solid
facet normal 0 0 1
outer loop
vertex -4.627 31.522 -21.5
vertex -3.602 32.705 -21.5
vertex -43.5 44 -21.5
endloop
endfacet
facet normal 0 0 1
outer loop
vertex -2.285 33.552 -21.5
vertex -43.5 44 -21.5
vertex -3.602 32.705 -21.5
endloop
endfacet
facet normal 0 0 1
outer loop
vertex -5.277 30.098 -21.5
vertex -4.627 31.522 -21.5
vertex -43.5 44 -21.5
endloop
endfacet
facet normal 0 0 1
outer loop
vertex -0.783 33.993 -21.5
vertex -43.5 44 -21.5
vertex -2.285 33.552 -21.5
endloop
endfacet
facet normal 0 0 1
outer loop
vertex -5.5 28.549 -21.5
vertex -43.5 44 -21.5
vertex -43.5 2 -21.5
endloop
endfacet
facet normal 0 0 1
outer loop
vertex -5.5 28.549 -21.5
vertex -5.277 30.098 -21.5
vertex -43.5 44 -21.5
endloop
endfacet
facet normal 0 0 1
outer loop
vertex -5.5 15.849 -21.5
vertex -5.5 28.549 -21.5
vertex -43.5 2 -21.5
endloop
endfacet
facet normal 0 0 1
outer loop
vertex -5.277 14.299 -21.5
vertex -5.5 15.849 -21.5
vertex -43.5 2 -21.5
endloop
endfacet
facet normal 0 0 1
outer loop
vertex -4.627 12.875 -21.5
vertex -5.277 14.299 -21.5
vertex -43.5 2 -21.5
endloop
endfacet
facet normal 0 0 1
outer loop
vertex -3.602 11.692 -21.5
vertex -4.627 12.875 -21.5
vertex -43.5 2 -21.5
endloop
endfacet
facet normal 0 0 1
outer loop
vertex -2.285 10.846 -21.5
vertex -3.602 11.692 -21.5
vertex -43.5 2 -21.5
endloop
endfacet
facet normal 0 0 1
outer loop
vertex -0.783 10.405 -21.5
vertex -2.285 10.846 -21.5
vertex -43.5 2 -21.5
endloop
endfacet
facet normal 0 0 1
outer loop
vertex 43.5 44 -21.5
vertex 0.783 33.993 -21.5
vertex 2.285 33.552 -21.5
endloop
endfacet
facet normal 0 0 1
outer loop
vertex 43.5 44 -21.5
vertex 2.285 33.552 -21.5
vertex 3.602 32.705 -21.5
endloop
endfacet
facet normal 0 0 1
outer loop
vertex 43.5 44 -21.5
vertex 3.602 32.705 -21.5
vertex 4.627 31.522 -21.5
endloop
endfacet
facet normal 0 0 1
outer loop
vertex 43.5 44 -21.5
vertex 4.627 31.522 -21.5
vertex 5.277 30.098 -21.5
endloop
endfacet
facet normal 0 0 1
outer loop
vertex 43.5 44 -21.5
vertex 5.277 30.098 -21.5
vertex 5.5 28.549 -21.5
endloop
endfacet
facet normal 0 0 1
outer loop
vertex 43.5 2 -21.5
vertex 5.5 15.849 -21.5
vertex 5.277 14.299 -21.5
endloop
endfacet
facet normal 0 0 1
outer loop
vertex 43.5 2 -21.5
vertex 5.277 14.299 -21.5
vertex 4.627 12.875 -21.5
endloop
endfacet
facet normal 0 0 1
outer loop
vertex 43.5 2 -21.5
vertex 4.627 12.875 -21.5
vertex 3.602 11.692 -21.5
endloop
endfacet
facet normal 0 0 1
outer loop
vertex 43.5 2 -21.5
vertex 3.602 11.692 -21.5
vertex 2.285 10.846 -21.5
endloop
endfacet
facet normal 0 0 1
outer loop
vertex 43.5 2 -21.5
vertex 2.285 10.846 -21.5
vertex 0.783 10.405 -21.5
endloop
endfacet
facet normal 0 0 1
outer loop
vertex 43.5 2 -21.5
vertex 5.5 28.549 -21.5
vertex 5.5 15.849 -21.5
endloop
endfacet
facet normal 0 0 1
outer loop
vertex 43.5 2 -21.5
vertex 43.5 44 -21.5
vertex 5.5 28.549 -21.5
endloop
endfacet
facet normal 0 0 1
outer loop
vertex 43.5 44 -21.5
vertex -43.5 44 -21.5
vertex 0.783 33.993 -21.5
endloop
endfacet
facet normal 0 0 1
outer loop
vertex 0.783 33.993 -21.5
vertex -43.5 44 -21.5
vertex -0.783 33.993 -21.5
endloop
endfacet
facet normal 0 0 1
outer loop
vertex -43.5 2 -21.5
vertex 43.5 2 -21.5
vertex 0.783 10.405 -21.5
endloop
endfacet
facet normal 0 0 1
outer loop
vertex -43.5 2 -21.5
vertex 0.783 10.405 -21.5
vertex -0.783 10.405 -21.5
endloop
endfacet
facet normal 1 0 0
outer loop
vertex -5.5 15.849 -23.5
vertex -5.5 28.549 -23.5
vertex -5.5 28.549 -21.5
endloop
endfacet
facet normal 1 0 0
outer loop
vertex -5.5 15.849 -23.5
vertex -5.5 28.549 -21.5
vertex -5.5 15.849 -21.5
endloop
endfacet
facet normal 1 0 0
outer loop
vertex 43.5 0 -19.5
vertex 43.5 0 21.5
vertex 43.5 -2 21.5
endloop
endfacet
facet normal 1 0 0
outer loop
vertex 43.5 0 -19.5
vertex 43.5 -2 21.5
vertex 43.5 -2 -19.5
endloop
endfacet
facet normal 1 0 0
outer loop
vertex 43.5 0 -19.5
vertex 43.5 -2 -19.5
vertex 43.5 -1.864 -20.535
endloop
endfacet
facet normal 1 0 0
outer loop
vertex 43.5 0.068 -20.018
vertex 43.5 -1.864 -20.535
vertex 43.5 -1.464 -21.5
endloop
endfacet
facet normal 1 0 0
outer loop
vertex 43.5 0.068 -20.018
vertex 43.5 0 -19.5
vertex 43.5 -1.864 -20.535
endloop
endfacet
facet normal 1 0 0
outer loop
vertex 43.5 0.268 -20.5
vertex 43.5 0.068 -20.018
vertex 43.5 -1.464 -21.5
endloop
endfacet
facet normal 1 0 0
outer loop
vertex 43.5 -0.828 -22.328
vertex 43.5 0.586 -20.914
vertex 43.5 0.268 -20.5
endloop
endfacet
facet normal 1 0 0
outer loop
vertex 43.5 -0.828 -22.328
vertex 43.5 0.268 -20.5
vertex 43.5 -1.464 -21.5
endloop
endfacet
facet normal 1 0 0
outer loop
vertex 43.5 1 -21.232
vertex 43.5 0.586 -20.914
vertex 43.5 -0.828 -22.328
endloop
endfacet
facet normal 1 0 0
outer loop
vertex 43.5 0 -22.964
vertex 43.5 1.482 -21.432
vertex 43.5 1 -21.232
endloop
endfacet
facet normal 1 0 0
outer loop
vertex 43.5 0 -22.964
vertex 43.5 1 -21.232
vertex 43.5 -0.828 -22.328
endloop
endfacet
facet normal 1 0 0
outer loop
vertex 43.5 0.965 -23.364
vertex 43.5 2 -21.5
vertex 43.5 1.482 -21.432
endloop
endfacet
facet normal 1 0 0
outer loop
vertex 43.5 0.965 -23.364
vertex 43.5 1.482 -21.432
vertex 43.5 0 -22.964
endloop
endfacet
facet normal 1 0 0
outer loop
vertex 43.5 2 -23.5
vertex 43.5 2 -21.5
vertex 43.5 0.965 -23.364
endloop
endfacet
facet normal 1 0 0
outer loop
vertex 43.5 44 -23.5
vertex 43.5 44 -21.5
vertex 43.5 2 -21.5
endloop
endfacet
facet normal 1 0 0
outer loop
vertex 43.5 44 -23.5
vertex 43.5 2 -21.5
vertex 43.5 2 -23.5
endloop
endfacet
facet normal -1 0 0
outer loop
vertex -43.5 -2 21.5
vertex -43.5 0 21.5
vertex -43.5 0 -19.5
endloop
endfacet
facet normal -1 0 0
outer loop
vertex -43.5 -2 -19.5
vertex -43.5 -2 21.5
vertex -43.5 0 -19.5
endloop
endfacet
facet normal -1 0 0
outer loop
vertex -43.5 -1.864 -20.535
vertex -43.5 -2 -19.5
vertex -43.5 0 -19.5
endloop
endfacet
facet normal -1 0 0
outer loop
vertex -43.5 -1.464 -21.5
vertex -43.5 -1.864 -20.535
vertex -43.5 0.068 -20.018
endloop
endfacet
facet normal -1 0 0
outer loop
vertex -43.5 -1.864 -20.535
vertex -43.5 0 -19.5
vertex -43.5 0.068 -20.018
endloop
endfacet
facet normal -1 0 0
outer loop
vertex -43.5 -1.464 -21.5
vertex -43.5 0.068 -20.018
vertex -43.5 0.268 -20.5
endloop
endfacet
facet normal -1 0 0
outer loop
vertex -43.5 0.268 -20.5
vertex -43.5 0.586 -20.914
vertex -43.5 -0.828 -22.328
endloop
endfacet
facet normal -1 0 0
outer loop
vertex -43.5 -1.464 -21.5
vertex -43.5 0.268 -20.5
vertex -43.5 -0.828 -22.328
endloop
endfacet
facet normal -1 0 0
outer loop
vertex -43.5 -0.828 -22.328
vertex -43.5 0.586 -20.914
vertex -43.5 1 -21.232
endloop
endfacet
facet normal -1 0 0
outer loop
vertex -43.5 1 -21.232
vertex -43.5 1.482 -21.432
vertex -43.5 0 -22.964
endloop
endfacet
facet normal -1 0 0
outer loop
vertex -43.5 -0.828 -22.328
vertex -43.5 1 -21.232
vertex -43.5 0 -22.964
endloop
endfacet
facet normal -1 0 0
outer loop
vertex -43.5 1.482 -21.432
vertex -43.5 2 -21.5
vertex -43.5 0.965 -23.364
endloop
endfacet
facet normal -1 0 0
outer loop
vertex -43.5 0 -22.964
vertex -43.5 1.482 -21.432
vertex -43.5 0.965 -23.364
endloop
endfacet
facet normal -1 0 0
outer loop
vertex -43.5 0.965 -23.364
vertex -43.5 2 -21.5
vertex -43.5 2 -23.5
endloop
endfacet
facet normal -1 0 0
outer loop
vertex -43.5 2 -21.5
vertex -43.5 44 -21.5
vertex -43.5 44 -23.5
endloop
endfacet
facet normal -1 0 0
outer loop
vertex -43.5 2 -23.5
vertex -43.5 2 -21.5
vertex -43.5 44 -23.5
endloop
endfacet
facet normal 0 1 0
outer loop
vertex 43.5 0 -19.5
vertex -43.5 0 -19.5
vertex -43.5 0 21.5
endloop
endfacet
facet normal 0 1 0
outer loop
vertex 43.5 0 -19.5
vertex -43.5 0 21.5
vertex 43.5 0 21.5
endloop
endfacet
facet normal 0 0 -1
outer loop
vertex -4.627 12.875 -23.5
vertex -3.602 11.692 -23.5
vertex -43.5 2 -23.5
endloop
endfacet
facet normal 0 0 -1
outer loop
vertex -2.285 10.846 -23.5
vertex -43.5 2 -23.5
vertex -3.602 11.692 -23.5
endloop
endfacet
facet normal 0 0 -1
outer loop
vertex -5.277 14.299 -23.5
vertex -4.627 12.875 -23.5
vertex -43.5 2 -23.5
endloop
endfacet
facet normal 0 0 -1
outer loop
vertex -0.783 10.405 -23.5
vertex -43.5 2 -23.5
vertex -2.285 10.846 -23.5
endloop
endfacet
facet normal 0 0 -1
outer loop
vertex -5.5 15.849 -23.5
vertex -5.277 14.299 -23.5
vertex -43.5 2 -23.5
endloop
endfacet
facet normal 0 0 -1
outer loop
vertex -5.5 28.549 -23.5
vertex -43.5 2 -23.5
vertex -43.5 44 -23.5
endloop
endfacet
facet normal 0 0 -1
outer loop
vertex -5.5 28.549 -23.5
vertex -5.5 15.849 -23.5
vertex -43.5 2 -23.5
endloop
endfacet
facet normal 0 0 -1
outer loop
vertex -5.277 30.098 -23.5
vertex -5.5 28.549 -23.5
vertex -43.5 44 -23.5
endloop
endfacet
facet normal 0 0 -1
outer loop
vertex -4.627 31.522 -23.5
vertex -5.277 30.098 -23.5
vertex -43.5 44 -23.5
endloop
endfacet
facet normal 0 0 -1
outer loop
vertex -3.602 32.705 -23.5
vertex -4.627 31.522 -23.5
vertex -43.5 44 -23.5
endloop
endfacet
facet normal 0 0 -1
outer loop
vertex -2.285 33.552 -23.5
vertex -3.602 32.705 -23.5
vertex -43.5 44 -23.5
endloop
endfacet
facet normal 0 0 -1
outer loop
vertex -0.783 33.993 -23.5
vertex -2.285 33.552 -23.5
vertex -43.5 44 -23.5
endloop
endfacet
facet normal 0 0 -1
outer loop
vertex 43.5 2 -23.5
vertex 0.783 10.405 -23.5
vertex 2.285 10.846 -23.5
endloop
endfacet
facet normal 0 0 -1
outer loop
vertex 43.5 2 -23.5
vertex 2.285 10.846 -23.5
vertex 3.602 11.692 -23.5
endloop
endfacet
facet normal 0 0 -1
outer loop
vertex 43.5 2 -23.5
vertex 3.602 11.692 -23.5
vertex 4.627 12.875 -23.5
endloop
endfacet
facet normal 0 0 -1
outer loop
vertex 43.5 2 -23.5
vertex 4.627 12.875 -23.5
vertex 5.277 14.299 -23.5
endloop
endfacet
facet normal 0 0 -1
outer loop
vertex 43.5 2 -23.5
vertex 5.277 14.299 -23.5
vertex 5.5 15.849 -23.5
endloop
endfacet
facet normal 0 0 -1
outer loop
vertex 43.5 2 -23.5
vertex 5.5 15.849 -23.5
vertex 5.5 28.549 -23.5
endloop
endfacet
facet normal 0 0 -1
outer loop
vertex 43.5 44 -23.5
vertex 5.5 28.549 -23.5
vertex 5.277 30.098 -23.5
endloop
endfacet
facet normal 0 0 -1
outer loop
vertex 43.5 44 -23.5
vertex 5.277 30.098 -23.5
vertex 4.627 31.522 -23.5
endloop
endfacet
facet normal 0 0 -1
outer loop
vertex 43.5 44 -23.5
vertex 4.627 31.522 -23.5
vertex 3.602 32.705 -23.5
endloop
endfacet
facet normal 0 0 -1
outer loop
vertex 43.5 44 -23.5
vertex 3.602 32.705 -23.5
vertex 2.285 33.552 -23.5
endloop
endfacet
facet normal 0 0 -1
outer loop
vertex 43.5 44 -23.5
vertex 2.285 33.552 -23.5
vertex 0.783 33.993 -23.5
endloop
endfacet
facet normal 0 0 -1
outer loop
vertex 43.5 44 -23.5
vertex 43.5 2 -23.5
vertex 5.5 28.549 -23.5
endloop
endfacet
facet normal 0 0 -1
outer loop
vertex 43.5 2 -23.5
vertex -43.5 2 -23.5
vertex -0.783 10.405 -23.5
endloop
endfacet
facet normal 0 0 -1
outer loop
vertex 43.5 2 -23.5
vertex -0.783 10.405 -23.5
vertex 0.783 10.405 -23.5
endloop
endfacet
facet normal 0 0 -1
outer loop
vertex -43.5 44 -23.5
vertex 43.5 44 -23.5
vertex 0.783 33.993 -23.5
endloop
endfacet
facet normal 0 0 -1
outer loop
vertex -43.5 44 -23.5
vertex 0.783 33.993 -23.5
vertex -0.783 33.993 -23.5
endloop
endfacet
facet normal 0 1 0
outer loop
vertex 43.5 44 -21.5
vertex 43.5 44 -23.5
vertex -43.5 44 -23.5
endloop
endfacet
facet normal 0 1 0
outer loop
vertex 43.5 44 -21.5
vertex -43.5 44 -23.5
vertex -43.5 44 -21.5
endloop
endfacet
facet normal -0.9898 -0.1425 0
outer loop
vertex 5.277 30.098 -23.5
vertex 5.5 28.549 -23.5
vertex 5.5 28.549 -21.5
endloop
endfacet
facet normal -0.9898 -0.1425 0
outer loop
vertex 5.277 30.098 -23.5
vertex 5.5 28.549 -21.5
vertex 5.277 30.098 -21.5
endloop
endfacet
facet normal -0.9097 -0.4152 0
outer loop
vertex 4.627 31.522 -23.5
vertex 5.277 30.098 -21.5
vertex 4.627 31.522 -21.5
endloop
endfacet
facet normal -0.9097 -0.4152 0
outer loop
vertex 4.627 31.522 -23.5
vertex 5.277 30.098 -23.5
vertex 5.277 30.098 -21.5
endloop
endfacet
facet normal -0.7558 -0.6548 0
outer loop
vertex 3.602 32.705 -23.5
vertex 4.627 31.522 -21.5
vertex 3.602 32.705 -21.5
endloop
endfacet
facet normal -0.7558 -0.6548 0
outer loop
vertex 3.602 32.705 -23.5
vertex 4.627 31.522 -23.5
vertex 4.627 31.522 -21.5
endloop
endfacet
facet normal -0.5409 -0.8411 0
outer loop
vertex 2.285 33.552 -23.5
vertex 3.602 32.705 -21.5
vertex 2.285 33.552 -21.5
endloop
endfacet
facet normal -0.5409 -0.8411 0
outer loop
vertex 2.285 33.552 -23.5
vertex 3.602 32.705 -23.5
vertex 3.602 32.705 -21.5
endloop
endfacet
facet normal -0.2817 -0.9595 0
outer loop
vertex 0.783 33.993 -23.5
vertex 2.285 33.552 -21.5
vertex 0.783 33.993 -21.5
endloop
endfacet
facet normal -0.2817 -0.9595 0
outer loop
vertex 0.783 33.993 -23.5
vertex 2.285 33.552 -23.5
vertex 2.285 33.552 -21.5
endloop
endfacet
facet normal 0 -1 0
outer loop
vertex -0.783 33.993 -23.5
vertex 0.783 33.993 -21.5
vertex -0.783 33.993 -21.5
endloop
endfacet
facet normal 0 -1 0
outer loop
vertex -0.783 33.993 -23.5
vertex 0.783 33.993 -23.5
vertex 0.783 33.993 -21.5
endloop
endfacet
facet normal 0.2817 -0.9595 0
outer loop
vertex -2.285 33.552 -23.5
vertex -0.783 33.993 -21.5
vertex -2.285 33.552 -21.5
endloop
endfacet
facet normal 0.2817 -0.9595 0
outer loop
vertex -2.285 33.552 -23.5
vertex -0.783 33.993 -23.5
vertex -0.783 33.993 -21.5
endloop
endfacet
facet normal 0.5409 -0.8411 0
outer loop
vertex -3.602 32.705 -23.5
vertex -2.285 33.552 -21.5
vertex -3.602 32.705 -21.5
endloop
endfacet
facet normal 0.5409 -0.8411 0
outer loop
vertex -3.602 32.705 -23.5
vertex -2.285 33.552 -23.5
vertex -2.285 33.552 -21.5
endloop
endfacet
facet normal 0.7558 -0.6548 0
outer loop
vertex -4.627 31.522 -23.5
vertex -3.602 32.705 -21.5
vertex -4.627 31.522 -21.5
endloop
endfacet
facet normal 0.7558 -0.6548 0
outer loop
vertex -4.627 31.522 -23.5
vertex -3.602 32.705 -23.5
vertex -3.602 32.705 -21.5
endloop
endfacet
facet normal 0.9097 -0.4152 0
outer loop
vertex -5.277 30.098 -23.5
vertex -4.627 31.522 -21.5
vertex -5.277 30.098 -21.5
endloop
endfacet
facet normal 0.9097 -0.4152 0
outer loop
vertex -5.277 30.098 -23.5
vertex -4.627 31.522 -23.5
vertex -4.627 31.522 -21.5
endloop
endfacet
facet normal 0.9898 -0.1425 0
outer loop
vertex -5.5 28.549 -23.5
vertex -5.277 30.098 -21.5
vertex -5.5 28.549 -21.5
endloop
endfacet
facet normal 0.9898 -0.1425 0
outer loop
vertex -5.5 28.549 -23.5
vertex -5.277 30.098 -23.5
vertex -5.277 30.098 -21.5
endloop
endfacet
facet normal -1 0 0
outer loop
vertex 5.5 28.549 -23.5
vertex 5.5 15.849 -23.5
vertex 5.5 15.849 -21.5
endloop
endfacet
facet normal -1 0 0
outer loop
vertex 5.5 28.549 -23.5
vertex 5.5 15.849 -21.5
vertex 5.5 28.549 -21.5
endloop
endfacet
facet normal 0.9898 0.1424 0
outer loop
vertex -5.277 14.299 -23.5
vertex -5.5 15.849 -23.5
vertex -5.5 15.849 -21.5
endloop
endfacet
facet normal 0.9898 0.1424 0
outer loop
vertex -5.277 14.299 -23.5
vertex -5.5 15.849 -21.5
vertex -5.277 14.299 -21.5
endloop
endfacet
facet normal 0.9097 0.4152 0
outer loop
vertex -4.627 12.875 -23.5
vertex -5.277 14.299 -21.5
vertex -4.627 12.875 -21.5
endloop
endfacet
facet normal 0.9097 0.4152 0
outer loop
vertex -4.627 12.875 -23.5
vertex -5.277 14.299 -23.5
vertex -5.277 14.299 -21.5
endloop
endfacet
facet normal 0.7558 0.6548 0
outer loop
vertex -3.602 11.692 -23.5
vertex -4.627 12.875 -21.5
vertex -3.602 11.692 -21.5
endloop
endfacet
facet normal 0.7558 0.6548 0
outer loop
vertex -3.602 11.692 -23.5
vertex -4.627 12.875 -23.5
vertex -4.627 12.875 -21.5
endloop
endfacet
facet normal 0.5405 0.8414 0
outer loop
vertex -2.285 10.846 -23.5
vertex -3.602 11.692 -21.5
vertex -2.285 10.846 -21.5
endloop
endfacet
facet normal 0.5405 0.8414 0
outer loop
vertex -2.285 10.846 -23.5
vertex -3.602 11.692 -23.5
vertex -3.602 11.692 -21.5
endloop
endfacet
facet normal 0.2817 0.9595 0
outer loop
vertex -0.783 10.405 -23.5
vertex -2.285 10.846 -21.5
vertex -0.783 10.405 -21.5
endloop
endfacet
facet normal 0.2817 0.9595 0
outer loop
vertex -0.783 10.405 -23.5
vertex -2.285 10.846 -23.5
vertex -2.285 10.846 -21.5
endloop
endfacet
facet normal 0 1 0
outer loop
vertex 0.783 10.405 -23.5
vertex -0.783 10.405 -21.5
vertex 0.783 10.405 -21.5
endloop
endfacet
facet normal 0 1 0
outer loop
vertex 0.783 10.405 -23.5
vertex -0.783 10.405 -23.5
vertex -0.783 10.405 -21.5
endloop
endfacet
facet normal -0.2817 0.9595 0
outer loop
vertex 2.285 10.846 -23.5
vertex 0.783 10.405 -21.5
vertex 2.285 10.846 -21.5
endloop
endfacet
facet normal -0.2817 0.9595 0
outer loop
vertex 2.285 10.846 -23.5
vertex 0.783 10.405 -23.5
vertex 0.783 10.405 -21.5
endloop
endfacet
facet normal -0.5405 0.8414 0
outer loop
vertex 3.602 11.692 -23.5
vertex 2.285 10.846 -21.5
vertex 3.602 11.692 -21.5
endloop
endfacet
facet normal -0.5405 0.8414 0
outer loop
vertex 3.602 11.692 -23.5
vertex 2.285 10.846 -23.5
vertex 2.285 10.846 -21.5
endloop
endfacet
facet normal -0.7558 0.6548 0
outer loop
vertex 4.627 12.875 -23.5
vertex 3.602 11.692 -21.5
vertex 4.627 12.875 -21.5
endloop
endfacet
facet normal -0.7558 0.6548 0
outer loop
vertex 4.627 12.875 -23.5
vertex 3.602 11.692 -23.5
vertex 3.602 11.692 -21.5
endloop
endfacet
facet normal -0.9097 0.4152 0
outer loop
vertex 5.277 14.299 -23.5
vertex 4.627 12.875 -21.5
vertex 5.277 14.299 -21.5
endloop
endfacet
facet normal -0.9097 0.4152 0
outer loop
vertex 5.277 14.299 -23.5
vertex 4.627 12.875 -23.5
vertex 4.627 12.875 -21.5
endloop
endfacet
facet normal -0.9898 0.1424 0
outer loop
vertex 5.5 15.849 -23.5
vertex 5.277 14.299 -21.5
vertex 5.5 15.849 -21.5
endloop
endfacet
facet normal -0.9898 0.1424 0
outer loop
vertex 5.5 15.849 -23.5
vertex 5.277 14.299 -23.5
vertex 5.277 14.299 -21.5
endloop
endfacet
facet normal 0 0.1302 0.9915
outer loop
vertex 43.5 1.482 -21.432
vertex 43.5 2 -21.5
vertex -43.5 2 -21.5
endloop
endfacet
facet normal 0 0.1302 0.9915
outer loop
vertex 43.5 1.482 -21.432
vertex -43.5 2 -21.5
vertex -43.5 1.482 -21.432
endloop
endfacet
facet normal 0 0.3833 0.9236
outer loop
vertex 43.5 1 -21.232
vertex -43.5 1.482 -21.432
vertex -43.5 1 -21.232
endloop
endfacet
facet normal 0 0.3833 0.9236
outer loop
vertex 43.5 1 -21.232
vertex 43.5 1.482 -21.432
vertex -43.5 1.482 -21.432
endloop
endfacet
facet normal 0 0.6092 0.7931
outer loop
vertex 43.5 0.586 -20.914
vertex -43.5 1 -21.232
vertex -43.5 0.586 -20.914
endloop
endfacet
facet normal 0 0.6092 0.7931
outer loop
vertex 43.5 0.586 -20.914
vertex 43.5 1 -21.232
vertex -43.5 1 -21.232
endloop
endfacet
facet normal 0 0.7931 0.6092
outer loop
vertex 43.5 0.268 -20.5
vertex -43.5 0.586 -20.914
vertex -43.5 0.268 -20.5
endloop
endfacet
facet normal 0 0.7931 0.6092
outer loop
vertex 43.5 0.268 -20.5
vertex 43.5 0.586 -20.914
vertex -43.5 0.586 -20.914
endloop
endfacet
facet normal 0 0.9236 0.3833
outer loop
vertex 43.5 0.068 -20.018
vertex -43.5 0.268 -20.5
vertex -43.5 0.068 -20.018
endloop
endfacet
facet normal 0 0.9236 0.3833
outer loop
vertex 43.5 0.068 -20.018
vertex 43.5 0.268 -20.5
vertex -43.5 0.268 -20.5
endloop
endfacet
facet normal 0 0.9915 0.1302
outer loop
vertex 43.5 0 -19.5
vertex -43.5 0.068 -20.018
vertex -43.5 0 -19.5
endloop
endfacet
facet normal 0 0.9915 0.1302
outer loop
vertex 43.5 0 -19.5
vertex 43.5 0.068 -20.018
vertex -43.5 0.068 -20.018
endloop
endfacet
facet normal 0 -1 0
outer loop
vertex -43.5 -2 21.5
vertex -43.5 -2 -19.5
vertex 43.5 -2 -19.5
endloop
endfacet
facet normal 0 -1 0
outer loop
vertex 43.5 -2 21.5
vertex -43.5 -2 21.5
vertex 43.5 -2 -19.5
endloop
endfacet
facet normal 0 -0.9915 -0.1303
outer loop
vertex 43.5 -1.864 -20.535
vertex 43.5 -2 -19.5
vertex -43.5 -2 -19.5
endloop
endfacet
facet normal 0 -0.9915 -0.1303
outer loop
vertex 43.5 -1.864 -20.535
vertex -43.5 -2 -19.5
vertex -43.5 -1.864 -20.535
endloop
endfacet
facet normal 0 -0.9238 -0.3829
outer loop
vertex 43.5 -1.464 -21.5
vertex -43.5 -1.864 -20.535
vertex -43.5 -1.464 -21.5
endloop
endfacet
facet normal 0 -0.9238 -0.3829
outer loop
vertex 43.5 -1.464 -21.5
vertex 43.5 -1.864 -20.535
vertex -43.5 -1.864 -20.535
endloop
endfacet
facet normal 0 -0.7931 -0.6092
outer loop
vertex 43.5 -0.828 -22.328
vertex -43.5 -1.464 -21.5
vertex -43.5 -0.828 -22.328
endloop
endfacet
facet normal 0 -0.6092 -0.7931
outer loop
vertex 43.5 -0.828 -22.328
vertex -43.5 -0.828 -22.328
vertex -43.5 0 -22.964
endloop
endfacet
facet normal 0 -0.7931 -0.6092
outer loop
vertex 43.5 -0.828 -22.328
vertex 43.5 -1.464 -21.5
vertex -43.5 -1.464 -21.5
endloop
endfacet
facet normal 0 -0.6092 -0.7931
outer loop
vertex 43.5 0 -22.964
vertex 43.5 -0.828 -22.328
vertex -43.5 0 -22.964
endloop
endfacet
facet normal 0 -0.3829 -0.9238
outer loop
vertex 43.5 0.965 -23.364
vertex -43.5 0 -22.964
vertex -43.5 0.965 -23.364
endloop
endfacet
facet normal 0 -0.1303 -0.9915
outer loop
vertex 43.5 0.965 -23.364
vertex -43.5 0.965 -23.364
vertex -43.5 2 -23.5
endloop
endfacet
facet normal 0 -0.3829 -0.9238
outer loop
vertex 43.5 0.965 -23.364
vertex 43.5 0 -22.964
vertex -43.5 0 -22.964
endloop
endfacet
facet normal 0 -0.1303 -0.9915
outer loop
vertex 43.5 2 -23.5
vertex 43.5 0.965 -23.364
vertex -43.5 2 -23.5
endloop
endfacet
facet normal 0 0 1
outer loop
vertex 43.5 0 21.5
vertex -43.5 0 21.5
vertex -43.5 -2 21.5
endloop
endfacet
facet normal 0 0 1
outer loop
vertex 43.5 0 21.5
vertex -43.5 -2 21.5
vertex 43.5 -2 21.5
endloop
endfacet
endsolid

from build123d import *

# Parameters (mm, degrees)
SKETCH1_W                    = 87
SKETCH1_H                    = 43
BASE_FLANGE1_DEPTH           = 2
EDGE_FLANGE1_STRIP_W         = 12
EDGE_FLANGE1_STRIP_H         = 2
EDGE_FLANGE1_STRIP_CUT_DEPTH = 87
EDGE_FLANGE1_DEPTH           = 87
CUT_EXTRUDE1_DEPTH           = 10


# Sheet-metal steps are written as plain solids
with BuildPart() as part:
    # Sketch1 → Base-Flange1 (new body)
    with BuildSketch(Plane(origin=(0, 0, 0), x_dir=(1, 0, 0), z_dir=(0, 1, 0))):
        Rectangle(SKETCH1_W, SKETCH1_H)
    extrude(amount=-BASE_FLANGE1_DEPTH)

    # Edge-Flange1 strip (across the edge) → Edge-Flange1 strip cut (cut)
    with BuildSketch(Plane(origin=(43.5, 0, -21.5), x_dir=(0, 0, 1), z_dir=(-1, 0, 0))):
        with Locations((-4, -1)):
            Rectangle(EDGE_FLANGE1_STRIP_W, EDGE_FLANGE1_STRIP_H)
    extrude(amount=EDGE_FLANGE1_STRIP_CUT_DEPTH, mode=Mode.SUBTRACT)

    # Edge-Flange1 section (across the edge) → Edge-Flange1 (add)
    with BuildSketch(Plane(origin=(43.5, 0, -21.5), x_dir=(0, 0, 1), z_dir=(-1, 0, 0))):
        with BuildLine():
            Line((-2, 2), (-2, 44))
            Line((-2, 44), (0, 44))
            Line((0, 44), (0, 2))
            ThreePointArc((0, 2), (0.585786438, 0.585786438), (2, 0))
            Line((2, 0), (2, -2))
            ThreePointArc((2, -2), (-0.828427125, -0.828427125), (-2, 2))
        make_face()
    extrude(amount=EDGE_FLANGE1_DEPTH)

    # Sketch9 → Cut-Extrude1 (cut)
    with BuildSketch(Plane(origin=(0, 0, -23.5), x_dir=(-1, 0, 0), z_dir=(0, 0, -1))):
        with BuildLine():
            Line((5.5, 28.548666546), (5.5, 15.848666546))
            ThreePointArc((5.5, 15.848666546), (0, 10.348666546), (-5.5, 15.848666546))
            Line((-5.5, 15.848666546), (-5.5, 28.548666546))
            ThreePointArc((-5.5, 28.548666546), (0, 34.048666546), (5.5, 28.548666546))
        make_face()
    extrude(amount=-CUT_EXTRUDE1_DEPTH, mode=Mode.SUBTRACT)


solid = part.part
